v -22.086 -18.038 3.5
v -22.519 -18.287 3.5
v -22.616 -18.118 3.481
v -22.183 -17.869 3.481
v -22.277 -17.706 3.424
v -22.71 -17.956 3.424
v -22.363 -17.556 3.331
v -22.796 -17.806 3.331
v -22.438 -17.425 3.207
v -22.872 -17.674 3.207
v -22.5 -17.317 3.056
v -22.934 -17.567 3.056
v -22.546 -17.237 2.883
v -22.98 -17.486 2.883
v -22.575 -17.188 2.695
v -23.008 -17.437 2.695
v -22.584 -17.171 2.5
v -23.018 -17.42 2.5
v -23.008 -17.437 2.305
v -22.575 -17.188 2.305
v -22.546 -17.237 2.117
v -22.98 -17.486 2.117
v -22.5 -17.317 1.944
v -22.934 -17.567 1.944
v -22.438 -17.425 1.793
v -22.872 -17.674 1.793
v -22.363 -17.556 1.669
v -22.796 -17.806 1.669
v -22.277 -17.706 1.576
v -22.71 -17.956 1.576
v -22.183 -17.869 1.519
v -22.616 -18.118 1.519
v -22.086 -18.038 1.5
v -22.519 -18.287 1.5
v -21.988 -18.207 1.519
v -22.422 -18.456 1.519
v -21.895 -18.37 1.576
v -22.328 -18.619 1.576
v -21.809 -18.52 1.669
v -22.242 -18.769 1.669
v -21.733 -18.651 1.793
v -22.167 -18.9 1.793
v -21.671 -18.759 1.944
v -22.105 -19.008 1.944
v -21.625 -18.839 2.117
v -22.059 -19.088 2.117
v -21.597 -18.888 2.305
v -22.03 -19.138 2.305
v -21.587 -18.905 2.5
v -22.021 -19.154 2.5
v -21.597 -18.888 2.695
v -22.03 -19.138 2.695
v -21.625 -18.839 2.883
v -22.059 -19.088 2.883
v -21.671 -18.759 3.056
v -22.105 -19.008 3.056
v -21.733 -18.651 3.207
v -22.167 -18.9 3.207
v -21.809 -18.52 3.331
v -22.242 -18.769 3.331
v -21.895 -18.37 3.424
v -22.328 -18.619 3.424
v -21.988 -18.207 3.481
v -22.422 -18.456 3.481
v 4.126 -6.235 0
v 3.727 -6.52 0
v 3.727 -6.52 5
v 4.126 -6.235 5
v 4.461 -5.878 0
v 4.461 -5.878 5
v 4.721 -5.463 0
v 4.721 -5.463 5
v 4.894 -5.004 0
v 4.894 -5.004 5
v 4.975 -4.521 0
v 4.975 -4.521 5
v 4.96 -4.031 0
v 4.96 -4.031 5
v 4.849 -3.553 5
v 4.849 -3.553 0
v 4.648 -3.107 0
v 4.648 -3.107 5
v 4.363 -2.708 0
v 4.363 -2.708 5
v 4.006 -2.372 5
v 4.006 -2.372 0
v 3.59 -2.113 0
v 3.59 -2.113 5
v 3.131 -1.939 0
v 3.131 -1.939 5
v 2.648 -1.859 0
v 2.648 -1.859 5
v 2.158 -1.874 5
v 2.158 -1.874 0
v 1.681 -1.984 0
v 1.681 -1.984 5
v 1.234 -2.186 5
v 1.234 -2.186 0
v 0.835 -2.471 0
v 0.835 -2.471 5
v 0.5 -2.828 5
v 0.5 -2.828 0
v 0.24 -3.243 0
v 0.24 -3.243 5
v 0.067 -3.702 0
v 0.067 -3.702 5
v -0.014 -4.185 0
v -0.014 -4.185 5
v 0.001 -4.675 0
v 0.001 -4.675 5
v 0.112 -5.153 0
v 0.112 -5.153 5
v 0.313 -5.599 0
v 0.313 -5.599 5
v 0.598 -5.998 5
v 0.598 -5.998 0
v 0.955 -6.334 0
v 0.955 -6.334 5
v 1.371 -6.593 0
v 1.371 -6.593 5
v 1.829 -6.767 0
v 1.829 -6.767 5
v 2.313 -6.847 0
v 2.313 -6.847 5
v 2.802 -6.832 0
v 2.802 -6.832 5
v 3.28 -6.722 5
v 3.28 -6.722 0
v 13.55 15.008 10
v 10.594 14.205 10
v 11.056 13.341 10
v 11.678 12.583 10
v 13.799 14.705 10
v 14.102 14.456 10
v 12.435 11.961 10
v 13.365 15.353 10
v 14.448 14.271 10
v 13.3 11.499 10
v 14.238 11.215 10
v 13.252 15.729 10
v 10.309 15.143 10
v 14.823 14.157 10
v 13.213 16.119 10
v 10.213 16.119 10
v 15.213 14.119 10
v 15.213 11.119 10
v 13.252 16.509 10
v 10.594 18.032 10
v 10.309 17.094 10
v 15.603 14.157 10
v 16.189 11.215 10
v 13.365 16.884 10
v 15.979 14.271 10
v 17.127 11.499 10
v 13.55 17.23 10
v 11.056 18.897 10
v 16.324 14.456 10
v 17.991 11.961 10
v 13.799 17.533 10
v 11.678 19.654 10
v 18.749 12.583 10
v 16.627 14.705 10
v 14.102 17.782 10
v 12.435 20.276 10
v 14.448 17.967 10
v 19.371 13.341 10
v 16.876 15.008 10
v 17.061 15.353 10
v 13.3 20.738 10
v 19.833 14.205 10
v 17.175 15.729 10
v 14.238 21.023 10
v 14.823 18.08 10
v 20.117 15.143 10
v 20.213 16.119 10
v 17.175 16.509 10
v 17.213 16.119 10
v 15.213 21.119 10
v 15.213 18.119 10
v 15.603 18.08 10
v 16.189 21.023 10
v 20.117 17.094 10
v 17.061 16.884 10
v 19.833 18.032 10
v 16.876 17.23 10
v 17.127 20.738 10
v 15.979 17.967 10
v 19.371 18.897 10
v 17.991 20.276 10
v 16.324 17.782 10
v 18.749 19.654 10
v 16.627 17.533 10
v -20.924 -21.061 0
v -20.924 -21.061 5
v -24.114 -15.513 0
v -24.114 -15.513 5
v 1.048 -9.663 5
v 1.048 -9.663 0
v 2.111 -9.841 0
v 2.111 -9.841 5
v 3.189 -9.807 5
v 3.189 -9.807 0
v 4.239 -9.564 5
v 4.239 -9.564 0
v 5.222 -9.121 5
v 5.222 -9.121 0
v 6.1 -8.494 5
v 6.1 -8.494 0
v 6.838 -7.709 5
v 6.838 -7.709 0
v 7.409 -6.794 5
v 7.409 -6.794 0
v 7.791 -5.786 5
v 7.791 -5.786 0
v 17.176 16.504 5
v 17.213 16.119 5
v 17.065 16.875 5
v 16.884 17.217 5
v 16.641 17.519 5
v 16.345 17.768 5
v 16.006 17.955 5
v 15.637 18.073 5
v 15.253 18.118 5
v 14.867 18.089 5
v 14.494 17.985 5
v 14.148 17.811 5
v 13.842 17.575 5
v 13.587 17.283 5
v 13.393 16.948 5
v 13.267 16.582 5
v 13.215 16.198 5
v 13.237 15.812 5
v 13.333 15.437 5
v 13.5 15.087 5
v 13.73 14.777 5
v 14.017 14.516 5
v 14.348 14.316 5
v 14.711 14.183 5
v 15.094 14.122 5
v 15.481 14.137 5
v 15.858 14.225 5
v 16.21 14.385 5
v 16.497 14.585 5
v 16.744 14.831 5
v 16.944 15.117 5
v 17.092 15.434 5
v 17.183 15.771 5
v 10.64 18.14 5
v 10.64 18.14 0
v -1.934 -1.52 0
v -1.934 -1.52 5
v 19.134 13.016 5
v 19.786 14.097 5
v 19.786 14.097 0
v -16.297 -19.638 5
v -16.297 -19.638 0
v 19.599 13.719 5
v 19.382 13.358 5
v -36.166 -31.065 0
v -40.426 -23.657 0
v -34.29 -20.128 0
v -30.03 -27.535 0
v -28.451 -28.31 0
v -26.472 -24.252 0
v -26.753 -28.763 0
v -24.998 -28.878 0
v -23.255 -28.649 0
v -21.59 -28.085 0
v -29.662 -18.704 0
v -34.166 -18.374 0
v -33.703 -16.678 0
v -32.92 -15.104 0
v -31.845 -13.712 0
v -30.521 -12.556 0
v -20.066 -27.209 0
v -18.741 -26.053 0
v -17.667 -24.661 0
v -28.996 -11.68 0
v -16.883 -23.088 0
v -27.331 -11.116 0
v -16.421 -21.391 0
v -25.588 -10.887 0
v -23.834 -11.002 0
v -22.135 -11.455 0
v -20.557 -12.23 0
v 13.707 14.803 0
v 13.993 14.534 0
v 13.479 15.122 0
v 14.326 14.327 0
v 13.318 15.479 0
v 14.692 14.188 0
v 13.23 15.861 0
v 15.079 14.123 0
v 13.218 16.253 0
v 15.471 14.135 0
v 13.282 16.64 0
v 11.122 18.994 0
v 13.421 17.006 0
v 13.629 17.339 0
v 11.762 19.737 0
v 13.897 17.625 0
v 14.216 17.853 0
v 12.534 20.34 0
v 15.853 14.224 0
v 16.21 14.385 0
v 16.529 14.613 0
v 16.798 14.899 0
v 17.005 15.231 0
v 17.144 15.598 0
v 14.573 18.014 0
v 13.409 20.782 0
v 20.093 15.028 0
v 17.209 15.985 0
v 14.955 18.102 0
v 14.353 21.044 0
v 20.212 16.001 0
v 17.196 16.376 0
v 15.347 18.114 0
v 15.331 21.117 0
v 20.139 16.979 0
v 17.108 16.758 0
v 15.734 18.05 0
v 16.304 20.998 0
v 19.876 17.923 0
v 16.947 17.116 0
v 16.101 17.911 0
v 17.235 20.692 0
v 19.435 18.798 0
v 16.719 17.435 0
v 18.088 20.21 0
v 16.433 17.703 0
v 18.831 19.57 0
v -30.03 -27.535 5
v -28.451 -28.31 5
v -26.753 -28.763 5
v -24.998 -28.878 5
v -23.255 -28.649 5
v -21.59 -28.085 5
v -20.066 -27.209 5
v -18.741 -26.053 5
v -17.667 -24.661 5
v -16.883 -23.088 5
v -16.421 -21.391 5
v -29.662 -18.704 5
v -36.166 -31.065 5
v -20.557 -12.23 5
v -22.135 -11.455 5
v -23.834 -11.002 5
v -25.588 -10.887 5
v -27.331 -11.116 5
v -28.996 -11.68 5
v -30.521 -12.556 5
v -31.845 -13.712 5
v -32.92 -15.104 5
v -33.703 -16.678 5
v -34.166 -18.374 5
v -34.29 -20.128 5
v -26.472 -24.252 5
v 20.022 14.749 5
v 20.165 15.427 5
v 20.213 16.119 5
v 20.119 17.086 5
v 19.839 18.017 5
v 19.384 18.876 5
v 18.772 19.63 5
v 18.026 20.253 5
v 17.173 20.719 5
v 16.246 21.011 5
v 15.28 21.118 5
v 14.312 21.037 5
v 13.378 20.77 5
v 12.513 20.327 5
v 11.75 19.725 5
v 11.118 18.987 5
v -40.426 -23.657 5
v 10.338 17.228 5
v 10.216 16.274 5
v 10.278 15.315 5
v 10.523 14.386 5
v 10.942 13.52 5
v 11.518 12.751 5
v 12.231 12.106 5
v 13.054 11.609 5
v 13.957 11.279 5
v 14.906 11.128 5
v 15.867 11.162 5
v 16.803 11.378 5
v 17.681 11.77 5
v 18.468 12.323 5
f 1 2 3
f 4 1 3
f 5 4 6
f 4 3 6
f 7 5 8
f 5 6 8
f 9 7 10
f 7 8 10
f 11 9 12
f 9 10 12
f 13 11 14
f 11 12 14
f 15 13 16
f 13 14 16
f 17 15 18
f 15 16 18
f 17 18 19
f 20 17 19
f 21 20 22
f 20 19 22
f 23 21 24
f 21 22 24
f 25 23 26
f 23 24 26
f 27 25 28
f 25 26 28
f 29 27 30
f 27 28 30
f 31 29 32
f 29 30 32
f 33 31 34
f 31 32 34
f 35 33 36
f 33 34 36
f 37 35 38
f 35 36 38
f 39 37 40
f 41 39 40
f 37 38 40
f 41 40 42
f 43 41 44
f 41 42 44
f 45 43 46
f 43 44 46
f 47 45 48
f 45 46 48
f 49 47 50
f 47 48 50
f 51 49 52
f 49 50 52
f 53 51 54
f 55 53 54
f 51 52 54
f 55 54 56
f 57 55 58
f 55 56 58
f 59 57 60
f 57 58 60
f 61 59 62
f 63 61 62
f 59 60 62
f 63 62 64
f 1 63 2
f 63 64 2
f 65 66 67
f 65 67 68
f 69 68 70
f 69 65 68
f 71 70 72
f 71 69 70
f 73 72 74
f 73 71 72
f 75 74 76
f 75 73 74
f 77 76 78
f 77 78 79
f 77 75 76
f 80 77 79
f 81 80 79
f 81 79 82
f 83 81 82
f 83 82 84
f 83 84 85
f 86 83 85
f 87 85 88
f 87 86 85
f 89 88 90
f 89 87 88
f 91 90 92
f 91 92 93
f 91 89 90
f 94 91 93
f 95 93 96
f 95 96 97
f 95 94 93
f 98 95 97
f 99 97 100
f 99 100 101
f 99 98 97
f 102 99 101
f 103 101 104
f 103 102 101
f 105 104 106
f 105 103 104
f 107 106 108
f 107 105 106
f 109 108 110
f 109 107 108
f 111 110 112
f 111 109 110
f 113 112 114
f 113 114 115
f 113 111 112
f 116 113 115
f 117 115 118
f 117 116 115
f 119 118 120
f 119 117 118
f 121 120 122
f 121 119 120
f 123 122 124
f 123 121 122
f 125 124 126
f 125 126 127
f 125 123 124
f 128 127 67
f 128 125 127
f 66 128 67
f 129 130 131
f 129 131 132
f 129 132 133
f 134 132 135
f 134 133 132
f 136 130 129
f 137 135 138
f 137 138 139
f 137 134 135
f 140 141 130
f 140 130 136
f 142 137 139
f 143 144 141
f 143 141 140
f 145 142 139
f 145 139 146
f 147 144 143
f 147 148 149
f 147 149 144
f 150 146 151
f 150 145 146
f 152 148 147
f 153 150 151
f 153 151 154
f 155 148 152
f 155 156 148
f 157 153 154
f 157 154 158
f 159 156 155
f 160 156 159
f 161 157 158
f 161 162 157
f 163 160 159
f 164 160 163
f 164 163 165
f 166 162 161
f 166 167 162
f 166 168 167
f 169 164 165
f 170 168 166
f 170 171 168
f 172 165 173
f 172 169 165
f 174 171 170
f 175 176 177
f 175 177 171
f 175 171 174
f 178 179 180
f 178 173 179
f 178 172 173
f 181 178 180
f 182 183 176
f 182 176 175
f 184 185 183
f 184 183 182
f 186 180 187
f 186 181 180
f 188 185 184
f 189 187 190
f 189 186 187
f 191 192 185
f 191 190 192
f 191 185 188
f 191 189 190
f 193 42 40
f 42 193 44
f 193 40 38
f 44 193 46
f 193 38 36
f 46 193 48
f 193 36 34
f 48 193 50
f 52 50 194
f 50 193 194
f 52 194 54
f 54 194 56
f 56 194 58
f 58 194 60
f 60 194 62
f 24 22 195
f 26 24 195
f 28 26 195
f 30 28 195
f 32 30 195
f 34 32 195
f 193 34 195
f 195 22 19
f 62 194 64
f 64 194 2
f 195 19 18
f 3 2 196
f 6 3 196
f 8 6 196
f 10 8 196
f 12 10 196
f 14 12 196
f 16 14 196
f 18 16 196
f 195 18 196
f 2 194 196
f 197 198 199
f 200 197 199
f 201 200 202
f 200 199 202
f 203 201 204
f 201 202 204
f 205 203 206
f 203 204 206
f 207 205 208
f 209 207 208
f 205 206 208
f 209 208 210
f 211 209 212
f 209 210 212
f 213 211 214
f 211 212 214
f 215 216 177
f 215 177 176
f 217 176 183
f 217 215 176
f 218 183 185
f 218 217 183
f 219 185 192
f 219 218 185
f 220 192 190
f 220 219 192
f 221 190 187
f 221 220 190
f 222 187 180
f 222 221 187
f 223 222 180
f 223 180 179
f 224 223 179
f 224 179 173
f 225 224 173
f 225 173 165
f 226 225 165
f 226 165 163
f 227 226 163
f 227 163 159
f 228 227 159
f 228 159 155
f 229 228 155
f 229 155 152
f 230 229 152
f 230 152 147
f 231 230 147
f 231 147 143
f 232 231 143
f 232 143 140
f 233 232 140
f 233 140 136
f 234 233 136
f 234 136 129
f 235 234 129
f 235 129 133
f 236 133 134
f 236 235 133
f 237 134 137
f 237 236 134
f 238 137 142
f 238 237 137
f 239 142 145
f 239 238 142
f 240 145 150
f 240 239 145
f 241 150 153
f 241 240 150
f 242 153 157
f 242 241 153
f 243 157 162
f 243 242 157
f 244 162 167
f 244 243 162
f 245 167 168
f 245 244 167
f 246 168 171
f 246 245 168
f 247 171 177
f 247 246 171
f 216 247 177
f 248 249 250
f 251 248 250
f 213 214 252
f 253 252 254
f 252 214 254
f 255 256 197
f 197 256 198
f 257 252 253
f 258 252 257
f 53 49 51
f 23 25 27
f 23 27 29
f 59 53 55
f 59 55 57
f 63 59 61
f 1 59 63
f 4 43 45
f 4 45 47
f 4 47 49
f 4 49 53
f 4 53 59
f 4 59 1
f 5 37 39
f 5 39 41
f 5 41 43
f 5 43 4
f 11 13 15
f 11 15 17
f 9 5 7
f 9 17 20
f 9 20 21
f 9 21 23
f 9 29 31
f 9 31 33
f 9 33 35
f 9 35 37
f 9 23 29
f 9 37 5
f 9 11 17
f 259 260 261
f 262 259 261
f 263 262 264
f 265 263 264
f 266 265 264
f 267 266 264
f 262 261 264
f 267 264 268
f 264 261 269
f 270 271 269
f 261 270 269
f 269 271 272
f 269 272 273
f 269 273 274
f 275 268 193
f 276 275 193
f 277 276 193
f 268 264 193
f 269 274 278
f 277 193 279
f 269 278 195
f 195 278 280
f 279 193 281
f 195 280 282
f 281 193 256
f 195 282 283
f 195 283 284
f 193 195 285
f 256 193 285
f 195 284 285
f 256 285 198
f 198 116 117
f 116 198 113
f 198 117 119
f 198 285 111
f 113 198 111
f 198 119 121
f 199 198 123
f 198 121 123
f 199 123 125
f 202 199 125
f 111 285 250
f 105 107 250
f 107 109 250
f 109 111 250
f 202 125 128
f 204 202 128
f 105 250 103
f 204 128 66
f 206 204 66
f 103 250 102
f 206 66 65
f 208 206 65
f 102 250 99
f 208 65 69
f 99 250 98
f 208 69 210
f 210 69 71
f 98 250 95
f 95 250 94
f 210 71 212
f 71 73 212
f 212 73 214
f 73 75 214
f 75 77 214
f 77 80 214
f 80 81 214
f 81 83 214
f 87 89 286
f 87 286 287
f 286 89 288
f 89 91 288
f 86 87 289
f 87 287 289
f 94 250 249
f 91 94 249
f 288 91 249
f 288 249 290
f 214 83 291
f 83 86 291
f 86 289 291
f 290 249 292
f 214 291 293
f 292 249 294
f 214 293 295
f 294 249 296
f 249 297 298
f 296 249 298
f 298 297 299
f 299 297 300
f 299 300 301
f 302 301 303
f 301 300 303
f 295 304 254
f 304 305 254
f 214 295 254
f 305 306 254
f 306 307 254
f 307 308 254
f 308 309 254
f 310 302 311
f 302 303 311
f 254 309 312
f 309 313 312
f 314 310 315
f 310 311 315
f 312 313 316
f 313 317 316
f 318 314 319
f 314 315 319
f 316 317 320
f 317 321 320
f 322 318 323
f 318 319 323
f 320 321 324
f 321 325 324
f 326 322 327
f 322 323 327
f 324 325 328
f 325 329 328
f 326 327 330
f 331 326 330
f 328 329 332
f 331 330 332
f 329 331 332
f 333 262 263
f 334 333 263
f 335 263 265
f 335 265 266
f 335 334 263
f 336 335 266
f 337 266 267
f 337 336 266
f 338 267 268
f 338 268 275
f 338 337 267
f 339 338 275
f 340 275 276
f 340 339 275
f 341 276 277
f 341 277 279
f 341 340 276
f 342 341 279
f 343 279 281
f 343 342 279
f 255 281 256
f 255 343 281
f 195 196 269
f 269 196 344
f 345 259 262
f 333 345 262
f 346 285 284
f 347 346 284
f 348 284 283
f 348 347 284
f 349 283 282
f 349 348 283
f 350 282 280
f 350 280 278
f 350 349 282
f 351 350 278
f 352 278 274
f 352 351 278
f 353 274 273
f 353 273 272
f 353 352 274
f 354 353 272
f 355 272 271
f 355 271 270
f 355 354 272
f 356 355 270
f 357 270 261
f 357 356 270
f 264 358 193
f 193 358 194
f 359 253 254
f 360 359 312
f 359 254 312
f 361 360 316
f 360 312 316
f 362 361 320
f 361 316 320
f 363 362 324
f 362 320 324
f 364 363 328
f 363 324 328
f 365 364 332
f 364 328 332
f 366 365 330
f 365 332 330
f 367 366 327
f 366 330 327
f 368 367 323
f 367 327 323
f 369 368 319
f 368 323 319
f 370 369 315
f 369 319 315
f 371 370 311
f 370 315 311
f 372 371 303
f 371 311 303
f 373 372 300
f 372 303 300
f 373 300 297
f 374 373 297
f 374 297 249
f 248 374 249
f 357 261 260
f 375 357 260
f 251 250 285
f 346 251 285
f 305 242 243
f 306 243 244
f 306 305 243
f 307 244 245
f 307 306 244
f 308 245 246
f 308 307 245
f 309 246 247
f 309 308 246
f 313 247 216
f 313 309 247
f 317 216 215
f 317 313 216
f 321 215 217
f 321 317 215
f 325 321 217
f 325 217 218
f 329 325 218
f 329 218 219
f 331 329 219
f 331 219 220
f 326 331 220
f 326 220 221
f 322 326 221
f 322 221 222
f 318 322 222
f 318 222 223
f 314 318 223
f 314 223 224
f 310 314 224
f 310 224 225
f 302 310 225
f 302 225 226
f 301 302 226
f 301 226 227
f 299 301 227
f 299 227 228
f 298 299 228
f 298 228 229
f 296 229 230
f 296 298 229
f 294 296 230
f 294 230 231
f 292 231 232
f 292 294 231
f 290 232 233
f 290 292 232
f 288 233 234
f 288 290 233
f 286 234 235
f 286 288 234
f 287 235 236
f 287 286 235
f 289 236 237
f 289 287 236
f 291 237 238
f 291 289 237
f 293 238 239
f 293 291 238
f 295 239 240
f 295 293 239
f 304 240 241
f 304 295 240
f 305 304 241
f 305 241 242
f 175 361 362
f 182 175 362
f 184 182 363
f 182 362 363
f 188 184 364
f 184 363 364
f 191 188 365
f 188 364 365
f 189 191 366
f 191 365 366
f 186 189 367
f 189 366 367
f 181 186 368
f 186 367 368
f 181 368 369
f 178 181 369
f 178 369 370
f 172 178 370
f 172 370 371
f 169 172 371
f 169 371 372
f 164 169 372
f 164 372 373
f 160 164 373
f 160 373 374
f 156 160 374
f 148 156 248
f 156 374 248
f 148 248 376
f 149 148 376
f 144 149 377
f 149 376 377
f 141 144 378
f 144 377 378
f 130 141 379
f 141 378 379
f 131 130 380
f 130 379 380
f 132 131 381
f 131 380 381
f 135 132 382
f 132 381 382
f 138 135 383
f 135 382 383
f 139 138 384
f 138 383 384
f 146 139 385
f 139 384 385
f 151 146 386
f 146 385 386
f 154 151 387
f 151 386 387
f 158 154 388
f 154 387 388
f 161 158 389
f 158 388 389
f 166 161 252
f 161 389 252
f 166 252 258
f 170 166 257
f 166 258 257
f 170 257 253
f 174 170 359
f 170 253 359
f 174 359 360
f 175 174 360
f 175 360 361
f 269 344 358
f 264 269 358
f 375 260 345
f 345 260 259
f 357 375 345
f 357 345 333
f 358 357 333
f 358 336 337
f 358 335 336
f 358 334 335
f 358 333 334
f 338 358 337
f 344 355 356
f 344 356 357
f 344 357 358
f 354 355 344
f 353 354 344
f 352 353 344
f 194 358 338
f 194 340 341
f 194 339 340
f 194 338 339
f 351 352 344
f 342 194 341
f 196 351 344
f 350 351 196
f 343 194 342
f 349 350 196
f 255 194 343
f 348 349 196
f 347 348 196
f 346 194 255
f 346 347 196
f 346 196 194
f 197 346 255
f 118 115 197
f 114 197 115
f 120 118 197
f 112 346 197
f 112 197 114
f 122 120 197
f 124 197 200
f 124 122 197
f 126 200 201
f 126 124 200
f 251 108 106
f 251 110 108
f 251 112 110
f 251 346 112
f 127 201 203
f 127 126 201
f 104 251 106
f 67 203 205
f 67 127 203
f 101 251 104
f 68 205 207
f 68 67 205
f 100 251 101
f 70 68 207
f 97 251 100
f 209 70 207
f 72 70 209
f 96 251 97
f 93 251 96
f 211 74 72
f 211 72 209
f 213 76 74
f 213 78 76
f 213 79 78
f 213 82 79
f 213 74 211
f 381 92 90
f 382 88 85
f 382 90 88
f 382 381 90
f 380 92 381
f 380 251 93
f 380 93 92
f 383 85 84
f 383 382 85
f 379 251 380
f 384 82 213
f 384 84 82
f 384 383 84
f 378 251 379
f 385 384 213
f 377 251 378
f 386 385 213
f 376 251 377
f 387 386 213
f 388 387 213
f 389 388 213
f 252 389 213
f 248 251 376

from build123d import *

# Parameters (mm, degrees)
SKETCH1_R           = 2
SKETCH1_R_2         = 2.5
BOSS_EXTRUDE1_DEPTH = 5
SKETCH6_R           = 9
BOSS_EXTRUDE3_DEPTH = 5
CUT_EXTRUDE1_REACH  = 7
SKETCH13_R          = 1
CUT_EXTRUDE2_DEPTH  = 0.5
SKETCH14_R          = 5
SKETCH14_R_2        = 2
BOSS_EXTRUDE4_DEPTH = 5


with BuildPart() as part:
    # Sketch1 → Boss-Extrude1 (new body)
    with BuildSketch(Plane(origin=(0, 0, 0), x_dir=(0.498528904, -0.866873077, 0), z_dir=(0, 0, 1))):
        with BuildLine():
            Line((8.899126574, 3.869128256), (-2.35642803, 24.179978159))
            ThreePointArc((-2.35642803, 24.179978159), (-9.345167797, 25.255857552), (-10.421047189, 18.267117784))
            Line((-10.421047189, 18.267117784), (1.120951981, -3.909046337))
            ThreePointArc((1.120951981, -3.909046337), (8.899126574, -3.909046337), (8.899126574, 3.869128256))
        make_face()
        with Locations((-6.38873761, 21.223547972)):
            Circle(SKETCH1_R, mode=Mode.SUBTRACT)
        with Locations((5.010039278, -0.019959041)):
            Circle(SKETCH1_R_2, mode=Mode.SUBTRACT)
        with BuildLine():
            Line((8.899126574, -46.838046337), (8.899126574, -3.909046337))
            ThreePointArc((8.899126574, -3.909046337), (5.010039278, -5.519959041), (1.120951981, -3.909046337))
            Line((1.120951981, -3.909046337), (0.353553391, -2.434608777))
            Line((0.353553391, -2.434608777), (0.353553391, -46.838046337))
            Line((0.353553391, -46.838046337), (8.899126574, -46.838046337))
        make_face()
    extrude(amount=BOSS_EXTRUDE1_DEPTH)

    # Sketch6 → Boss-Extrude3 (add)
    with BuildSketch(Plane.XY.offset(5)):
        with Locations((-25.293181008, -19.882635909)):
            Circle(SKETCH6_R)
    extrude(amount=-BOSS_EXTRUDE3_DEPTH)

    # Sketch12 → Cut-Extrude1 (cut, up to next)
    with BuildSketch(Plane.XY.offset(5), mode=Mode.PRIVATE) as cut_extrude1_sk1:
        Polygon((-20.923894669, -21.061337265), (-24.114479652, -15.51334957), (-29.662467347, -18.703934553), (-26.471882365, -24.251922248), align=None)
    cut_extrude1_tool1 = extrude(cut_extrude1_sk1.sketch, amount=-CUT_EXTRUDE1_REACH, mode=Mode.PRIVATE) & part.part
    add(cut_extrude1_tool1.solids().sort_by_distance((-25.293181, -19.882636, 5))[0], mode=Mode.SUBTRACT)

    # Sketch13 → Cut-Extrude2 (cut)
    with BuildSketch(Plane(origin=(-24.825551359, -14.27689384, 0), x_dir=(0, 0, 1), z_dir=(-0.866873077, -0.498528904, 0))):
        with Locations((2.5, -4.626339983)):
            Circle(SKETCH13_R)
    extrude(amount=-CUT_EXTRUDE2_DEPTH, mode=Mode.SUBTRACT)

    # Sketch14 → Boss-Extrude4 (add)
    with BuildSketch(Plane.XY.offset(5)):
        with Locations((15.213151988, 16.118776732)):
            Circle(SKETCH14_R)
        with Locations((15.213151988, 16.118776732)):
            Circle(SKETCH14_R_2, mode=Mode.SUBTRACT)
    extrude(amount=BOSS_EXTRUDE4_DEPTH)


solid = part.part
